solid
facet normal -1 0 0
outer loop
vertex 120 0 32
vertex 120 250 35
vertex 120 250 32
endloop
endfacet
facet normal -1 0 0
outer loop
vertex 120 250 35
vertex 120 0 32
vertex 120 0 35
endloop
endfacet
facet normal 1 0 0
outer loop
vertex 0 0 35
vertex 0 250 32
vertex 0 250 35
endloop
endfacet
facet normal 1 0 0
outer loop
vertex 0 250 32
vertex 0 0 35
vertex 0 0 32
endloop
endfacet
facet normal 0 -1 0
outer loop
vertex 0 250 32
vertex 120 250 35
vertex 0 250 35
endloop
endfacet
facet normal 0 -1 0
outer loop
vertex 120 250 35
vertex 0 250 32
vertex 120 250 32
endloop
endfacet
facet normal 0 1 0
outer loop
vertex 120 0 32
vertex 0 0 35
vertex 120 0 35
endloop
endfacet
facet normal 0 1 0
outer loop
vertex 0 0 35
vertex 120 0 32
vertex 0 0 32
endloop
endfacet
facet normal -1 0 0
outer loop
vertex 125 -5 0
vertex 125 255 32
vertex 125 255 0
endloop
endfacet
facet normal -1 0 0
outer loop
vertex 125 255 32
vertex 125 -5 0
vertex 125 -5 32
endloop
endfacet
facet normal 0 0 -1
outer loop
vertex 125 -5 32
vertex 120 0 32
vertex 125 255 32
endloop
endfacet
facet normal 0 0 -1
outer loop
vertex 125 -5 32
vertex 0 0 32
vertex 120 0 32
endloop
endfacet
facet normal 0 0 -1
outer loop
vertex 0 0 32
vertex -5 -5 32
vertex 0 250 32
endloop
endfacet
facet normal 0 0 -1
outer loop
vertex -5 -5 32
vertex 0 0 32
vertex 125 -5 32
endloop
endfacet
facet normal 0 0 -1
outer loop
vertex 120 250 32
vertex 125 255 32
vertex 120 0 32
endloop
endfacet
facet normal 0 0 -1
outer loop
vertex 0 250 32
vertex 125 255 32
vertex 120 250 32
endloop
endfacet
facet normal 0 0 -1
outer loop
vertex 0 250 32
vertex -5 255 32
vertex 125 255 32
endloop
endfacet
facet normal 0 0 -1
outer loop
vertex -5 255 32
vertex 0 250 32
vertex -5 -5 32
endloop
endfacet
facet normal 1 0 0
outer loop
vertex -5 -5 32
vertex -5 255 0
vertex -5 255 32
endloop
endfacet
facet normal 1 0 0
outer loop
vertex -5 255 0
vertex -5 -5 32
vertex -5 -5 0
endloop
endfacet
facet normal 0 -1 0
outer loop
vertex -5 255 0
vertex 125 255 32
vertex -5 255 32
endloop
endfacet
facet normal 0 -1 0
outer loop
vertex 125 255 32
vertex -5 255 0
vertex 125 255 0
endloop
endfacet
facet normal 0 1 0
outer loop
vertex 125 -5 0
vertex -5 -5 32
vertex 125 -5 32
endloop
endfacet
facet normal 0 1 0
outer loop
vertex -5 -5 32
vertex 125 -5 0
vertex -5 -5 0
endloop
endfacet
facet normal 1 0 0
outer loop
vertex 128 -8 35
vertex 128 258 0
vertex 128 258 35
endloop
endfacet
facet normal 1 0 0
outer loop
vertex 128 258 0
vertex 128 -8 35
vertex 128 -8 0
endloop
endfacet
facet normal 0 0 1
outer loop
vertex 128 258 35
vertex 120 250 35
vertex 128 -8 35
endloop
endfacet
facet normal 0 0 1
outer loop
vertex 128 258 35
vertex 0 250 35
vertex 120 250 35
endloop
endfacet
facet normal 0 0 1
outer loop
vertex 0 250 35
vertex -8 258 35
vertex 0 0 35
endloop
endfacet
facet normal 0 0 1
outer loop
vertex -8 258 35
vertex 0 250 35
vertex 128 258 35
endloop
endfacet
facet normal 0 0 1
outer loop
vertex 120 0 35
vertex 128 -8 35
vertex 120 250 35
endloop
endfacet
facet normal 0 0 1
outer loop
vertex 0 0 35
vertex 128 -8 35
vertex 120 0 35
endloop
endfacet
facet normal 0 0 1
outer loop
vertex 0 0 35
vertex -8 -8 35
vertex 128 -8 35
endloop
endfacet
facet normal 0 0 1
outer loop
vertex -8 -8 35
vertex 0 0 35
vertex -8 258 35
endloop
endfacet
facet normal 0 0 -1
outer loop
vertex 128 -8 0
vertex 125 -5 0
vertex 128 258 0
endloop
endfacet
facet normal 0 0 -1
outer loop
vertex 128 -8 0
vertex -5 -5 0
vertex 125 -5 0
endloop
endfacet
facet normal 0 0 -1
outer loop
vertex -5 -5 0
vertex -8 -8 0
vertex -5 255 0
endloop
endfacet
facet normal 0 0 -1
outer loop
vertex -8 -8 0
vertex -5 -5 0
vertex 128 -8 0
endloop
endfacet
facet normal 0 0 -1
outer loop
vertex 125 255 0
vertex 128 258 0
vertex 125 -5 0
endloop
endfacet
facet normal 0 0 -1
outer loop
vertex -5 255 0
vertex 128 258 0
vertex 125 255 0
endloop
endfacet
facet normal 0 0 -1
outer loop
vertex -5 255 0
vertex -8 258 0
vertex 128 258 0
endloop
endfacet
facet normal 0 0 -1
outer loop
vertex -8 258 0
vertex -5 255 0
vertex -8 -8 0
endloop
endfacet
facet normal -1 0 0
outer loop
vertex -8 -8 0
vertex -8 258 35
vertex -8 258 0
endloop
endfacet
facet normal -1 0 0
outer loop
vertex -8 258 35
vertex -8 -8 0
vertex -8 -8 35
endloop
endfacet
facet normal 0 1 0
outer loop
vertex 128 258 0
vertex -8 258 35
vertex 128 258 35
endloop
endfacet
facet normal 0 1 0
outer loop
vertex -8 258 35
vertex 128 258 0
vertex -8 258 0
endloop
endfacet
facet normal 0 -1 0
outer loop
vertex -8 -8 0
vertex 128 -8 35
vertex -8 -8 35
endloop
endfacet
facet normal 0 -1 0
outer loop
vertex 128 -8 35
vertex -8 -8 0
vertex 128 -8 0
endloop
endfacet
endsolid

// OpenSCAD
//#######################################################
//  _  __    _    ___ __________ _   _   _____ ___    _    __  __
// | |/ /   / \  |_ _|__  / ____| \ | | |  ___/ _ \  / \  |  \/  |
// | ' /   / _ \  | |  / /|  _| |  \| | | |_ | | | |/ _ \ | |\/| |
// | . \  / ___ \ | | / /_| |___| |\  | |  _|| |_| / ___ \| |  | |
// |_|\_\/_/   \_\___/____|_____|_| \_| |_|   \___/_/   \_\_|  |_|
                                                               //
// ____   _____  __
// | __ ) / _ \ \/ /
// |  _ \| | | \  /
// | |_) | |_| /  \
// |____/ \___/_/\_\
//#######################################################

// OpenScad file to help me quickly generate frames for [kazien
// foam](https://www.fastcap.com/product/kaizen-foam) Simply edit the variables
// below to reflect the size of the foam you want to make a frame for, then
// compile and you are set.


// Dimensions of the foam you would like to make a box for
inner_width = 120;
inner_height = 32;
inner_depth = 250;

// thickness of the plastic in mm.
overhang = 5; // overhang of inner lip that keeps the foam inplace
wall_width = 3; // thickness of vertical walls be around the box
wall_height = 3; // thickness of the top layer of the box

difference(){


translate([-(overhang+wall_width), -(overhang+wall_width), 0])
color("red")
cube([
        inner_width + 2*(overhang+wall_width),
        inner_depth + 2*(overhang+wall_width),
        inner_height+wall_height
        ]);


// cut out
union(){
    translate([0,0,-10])
    cube([
        inner_width,
        inner_depth,
        inner_height+100
        ]);
     translate([-overhang, -overhang, -10])
     cube([
        inner_width + 2*overhang,
        inner_depth + 2*overhang,
        inner_height+10
        ]);
}
}
